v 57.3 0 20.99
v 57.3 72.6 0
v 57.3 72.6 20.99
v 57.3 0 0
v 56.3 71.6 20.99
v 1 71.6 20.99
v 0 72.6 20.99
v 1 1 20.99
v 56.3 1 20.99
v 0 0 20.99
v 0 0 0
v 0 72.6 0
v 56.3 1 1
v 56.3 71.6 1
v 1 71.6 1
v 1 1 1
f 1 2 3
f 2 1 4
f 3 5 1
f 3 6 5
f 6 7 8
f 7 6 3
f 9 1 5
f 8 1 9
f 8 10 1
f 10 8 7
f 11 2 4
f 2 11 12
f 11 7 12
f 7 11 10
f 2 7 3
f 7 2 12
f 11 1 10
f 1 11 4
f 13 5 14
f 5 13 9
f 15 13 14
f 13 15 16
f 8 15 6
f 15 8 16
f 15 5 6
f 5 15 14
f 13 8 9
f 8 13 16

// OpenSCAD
inner_tol = 1;
wall_thickness = 1;
standoff_height = 6;
box_inner = [53.3 + 2*inner_tol, 68.6 + 2*inner_tol, 14 + standoff_height];

difference(){
    cube([box_inner[0] + 2*wall_thickness, box_inner[1] + 2*wall_thickness, box_inner[2] + wall_thickness - 0.01], false);
    translate([wall_thickness, wall_thickness, wall_thickness]){
        cube(box_inner, false);
    }
};
